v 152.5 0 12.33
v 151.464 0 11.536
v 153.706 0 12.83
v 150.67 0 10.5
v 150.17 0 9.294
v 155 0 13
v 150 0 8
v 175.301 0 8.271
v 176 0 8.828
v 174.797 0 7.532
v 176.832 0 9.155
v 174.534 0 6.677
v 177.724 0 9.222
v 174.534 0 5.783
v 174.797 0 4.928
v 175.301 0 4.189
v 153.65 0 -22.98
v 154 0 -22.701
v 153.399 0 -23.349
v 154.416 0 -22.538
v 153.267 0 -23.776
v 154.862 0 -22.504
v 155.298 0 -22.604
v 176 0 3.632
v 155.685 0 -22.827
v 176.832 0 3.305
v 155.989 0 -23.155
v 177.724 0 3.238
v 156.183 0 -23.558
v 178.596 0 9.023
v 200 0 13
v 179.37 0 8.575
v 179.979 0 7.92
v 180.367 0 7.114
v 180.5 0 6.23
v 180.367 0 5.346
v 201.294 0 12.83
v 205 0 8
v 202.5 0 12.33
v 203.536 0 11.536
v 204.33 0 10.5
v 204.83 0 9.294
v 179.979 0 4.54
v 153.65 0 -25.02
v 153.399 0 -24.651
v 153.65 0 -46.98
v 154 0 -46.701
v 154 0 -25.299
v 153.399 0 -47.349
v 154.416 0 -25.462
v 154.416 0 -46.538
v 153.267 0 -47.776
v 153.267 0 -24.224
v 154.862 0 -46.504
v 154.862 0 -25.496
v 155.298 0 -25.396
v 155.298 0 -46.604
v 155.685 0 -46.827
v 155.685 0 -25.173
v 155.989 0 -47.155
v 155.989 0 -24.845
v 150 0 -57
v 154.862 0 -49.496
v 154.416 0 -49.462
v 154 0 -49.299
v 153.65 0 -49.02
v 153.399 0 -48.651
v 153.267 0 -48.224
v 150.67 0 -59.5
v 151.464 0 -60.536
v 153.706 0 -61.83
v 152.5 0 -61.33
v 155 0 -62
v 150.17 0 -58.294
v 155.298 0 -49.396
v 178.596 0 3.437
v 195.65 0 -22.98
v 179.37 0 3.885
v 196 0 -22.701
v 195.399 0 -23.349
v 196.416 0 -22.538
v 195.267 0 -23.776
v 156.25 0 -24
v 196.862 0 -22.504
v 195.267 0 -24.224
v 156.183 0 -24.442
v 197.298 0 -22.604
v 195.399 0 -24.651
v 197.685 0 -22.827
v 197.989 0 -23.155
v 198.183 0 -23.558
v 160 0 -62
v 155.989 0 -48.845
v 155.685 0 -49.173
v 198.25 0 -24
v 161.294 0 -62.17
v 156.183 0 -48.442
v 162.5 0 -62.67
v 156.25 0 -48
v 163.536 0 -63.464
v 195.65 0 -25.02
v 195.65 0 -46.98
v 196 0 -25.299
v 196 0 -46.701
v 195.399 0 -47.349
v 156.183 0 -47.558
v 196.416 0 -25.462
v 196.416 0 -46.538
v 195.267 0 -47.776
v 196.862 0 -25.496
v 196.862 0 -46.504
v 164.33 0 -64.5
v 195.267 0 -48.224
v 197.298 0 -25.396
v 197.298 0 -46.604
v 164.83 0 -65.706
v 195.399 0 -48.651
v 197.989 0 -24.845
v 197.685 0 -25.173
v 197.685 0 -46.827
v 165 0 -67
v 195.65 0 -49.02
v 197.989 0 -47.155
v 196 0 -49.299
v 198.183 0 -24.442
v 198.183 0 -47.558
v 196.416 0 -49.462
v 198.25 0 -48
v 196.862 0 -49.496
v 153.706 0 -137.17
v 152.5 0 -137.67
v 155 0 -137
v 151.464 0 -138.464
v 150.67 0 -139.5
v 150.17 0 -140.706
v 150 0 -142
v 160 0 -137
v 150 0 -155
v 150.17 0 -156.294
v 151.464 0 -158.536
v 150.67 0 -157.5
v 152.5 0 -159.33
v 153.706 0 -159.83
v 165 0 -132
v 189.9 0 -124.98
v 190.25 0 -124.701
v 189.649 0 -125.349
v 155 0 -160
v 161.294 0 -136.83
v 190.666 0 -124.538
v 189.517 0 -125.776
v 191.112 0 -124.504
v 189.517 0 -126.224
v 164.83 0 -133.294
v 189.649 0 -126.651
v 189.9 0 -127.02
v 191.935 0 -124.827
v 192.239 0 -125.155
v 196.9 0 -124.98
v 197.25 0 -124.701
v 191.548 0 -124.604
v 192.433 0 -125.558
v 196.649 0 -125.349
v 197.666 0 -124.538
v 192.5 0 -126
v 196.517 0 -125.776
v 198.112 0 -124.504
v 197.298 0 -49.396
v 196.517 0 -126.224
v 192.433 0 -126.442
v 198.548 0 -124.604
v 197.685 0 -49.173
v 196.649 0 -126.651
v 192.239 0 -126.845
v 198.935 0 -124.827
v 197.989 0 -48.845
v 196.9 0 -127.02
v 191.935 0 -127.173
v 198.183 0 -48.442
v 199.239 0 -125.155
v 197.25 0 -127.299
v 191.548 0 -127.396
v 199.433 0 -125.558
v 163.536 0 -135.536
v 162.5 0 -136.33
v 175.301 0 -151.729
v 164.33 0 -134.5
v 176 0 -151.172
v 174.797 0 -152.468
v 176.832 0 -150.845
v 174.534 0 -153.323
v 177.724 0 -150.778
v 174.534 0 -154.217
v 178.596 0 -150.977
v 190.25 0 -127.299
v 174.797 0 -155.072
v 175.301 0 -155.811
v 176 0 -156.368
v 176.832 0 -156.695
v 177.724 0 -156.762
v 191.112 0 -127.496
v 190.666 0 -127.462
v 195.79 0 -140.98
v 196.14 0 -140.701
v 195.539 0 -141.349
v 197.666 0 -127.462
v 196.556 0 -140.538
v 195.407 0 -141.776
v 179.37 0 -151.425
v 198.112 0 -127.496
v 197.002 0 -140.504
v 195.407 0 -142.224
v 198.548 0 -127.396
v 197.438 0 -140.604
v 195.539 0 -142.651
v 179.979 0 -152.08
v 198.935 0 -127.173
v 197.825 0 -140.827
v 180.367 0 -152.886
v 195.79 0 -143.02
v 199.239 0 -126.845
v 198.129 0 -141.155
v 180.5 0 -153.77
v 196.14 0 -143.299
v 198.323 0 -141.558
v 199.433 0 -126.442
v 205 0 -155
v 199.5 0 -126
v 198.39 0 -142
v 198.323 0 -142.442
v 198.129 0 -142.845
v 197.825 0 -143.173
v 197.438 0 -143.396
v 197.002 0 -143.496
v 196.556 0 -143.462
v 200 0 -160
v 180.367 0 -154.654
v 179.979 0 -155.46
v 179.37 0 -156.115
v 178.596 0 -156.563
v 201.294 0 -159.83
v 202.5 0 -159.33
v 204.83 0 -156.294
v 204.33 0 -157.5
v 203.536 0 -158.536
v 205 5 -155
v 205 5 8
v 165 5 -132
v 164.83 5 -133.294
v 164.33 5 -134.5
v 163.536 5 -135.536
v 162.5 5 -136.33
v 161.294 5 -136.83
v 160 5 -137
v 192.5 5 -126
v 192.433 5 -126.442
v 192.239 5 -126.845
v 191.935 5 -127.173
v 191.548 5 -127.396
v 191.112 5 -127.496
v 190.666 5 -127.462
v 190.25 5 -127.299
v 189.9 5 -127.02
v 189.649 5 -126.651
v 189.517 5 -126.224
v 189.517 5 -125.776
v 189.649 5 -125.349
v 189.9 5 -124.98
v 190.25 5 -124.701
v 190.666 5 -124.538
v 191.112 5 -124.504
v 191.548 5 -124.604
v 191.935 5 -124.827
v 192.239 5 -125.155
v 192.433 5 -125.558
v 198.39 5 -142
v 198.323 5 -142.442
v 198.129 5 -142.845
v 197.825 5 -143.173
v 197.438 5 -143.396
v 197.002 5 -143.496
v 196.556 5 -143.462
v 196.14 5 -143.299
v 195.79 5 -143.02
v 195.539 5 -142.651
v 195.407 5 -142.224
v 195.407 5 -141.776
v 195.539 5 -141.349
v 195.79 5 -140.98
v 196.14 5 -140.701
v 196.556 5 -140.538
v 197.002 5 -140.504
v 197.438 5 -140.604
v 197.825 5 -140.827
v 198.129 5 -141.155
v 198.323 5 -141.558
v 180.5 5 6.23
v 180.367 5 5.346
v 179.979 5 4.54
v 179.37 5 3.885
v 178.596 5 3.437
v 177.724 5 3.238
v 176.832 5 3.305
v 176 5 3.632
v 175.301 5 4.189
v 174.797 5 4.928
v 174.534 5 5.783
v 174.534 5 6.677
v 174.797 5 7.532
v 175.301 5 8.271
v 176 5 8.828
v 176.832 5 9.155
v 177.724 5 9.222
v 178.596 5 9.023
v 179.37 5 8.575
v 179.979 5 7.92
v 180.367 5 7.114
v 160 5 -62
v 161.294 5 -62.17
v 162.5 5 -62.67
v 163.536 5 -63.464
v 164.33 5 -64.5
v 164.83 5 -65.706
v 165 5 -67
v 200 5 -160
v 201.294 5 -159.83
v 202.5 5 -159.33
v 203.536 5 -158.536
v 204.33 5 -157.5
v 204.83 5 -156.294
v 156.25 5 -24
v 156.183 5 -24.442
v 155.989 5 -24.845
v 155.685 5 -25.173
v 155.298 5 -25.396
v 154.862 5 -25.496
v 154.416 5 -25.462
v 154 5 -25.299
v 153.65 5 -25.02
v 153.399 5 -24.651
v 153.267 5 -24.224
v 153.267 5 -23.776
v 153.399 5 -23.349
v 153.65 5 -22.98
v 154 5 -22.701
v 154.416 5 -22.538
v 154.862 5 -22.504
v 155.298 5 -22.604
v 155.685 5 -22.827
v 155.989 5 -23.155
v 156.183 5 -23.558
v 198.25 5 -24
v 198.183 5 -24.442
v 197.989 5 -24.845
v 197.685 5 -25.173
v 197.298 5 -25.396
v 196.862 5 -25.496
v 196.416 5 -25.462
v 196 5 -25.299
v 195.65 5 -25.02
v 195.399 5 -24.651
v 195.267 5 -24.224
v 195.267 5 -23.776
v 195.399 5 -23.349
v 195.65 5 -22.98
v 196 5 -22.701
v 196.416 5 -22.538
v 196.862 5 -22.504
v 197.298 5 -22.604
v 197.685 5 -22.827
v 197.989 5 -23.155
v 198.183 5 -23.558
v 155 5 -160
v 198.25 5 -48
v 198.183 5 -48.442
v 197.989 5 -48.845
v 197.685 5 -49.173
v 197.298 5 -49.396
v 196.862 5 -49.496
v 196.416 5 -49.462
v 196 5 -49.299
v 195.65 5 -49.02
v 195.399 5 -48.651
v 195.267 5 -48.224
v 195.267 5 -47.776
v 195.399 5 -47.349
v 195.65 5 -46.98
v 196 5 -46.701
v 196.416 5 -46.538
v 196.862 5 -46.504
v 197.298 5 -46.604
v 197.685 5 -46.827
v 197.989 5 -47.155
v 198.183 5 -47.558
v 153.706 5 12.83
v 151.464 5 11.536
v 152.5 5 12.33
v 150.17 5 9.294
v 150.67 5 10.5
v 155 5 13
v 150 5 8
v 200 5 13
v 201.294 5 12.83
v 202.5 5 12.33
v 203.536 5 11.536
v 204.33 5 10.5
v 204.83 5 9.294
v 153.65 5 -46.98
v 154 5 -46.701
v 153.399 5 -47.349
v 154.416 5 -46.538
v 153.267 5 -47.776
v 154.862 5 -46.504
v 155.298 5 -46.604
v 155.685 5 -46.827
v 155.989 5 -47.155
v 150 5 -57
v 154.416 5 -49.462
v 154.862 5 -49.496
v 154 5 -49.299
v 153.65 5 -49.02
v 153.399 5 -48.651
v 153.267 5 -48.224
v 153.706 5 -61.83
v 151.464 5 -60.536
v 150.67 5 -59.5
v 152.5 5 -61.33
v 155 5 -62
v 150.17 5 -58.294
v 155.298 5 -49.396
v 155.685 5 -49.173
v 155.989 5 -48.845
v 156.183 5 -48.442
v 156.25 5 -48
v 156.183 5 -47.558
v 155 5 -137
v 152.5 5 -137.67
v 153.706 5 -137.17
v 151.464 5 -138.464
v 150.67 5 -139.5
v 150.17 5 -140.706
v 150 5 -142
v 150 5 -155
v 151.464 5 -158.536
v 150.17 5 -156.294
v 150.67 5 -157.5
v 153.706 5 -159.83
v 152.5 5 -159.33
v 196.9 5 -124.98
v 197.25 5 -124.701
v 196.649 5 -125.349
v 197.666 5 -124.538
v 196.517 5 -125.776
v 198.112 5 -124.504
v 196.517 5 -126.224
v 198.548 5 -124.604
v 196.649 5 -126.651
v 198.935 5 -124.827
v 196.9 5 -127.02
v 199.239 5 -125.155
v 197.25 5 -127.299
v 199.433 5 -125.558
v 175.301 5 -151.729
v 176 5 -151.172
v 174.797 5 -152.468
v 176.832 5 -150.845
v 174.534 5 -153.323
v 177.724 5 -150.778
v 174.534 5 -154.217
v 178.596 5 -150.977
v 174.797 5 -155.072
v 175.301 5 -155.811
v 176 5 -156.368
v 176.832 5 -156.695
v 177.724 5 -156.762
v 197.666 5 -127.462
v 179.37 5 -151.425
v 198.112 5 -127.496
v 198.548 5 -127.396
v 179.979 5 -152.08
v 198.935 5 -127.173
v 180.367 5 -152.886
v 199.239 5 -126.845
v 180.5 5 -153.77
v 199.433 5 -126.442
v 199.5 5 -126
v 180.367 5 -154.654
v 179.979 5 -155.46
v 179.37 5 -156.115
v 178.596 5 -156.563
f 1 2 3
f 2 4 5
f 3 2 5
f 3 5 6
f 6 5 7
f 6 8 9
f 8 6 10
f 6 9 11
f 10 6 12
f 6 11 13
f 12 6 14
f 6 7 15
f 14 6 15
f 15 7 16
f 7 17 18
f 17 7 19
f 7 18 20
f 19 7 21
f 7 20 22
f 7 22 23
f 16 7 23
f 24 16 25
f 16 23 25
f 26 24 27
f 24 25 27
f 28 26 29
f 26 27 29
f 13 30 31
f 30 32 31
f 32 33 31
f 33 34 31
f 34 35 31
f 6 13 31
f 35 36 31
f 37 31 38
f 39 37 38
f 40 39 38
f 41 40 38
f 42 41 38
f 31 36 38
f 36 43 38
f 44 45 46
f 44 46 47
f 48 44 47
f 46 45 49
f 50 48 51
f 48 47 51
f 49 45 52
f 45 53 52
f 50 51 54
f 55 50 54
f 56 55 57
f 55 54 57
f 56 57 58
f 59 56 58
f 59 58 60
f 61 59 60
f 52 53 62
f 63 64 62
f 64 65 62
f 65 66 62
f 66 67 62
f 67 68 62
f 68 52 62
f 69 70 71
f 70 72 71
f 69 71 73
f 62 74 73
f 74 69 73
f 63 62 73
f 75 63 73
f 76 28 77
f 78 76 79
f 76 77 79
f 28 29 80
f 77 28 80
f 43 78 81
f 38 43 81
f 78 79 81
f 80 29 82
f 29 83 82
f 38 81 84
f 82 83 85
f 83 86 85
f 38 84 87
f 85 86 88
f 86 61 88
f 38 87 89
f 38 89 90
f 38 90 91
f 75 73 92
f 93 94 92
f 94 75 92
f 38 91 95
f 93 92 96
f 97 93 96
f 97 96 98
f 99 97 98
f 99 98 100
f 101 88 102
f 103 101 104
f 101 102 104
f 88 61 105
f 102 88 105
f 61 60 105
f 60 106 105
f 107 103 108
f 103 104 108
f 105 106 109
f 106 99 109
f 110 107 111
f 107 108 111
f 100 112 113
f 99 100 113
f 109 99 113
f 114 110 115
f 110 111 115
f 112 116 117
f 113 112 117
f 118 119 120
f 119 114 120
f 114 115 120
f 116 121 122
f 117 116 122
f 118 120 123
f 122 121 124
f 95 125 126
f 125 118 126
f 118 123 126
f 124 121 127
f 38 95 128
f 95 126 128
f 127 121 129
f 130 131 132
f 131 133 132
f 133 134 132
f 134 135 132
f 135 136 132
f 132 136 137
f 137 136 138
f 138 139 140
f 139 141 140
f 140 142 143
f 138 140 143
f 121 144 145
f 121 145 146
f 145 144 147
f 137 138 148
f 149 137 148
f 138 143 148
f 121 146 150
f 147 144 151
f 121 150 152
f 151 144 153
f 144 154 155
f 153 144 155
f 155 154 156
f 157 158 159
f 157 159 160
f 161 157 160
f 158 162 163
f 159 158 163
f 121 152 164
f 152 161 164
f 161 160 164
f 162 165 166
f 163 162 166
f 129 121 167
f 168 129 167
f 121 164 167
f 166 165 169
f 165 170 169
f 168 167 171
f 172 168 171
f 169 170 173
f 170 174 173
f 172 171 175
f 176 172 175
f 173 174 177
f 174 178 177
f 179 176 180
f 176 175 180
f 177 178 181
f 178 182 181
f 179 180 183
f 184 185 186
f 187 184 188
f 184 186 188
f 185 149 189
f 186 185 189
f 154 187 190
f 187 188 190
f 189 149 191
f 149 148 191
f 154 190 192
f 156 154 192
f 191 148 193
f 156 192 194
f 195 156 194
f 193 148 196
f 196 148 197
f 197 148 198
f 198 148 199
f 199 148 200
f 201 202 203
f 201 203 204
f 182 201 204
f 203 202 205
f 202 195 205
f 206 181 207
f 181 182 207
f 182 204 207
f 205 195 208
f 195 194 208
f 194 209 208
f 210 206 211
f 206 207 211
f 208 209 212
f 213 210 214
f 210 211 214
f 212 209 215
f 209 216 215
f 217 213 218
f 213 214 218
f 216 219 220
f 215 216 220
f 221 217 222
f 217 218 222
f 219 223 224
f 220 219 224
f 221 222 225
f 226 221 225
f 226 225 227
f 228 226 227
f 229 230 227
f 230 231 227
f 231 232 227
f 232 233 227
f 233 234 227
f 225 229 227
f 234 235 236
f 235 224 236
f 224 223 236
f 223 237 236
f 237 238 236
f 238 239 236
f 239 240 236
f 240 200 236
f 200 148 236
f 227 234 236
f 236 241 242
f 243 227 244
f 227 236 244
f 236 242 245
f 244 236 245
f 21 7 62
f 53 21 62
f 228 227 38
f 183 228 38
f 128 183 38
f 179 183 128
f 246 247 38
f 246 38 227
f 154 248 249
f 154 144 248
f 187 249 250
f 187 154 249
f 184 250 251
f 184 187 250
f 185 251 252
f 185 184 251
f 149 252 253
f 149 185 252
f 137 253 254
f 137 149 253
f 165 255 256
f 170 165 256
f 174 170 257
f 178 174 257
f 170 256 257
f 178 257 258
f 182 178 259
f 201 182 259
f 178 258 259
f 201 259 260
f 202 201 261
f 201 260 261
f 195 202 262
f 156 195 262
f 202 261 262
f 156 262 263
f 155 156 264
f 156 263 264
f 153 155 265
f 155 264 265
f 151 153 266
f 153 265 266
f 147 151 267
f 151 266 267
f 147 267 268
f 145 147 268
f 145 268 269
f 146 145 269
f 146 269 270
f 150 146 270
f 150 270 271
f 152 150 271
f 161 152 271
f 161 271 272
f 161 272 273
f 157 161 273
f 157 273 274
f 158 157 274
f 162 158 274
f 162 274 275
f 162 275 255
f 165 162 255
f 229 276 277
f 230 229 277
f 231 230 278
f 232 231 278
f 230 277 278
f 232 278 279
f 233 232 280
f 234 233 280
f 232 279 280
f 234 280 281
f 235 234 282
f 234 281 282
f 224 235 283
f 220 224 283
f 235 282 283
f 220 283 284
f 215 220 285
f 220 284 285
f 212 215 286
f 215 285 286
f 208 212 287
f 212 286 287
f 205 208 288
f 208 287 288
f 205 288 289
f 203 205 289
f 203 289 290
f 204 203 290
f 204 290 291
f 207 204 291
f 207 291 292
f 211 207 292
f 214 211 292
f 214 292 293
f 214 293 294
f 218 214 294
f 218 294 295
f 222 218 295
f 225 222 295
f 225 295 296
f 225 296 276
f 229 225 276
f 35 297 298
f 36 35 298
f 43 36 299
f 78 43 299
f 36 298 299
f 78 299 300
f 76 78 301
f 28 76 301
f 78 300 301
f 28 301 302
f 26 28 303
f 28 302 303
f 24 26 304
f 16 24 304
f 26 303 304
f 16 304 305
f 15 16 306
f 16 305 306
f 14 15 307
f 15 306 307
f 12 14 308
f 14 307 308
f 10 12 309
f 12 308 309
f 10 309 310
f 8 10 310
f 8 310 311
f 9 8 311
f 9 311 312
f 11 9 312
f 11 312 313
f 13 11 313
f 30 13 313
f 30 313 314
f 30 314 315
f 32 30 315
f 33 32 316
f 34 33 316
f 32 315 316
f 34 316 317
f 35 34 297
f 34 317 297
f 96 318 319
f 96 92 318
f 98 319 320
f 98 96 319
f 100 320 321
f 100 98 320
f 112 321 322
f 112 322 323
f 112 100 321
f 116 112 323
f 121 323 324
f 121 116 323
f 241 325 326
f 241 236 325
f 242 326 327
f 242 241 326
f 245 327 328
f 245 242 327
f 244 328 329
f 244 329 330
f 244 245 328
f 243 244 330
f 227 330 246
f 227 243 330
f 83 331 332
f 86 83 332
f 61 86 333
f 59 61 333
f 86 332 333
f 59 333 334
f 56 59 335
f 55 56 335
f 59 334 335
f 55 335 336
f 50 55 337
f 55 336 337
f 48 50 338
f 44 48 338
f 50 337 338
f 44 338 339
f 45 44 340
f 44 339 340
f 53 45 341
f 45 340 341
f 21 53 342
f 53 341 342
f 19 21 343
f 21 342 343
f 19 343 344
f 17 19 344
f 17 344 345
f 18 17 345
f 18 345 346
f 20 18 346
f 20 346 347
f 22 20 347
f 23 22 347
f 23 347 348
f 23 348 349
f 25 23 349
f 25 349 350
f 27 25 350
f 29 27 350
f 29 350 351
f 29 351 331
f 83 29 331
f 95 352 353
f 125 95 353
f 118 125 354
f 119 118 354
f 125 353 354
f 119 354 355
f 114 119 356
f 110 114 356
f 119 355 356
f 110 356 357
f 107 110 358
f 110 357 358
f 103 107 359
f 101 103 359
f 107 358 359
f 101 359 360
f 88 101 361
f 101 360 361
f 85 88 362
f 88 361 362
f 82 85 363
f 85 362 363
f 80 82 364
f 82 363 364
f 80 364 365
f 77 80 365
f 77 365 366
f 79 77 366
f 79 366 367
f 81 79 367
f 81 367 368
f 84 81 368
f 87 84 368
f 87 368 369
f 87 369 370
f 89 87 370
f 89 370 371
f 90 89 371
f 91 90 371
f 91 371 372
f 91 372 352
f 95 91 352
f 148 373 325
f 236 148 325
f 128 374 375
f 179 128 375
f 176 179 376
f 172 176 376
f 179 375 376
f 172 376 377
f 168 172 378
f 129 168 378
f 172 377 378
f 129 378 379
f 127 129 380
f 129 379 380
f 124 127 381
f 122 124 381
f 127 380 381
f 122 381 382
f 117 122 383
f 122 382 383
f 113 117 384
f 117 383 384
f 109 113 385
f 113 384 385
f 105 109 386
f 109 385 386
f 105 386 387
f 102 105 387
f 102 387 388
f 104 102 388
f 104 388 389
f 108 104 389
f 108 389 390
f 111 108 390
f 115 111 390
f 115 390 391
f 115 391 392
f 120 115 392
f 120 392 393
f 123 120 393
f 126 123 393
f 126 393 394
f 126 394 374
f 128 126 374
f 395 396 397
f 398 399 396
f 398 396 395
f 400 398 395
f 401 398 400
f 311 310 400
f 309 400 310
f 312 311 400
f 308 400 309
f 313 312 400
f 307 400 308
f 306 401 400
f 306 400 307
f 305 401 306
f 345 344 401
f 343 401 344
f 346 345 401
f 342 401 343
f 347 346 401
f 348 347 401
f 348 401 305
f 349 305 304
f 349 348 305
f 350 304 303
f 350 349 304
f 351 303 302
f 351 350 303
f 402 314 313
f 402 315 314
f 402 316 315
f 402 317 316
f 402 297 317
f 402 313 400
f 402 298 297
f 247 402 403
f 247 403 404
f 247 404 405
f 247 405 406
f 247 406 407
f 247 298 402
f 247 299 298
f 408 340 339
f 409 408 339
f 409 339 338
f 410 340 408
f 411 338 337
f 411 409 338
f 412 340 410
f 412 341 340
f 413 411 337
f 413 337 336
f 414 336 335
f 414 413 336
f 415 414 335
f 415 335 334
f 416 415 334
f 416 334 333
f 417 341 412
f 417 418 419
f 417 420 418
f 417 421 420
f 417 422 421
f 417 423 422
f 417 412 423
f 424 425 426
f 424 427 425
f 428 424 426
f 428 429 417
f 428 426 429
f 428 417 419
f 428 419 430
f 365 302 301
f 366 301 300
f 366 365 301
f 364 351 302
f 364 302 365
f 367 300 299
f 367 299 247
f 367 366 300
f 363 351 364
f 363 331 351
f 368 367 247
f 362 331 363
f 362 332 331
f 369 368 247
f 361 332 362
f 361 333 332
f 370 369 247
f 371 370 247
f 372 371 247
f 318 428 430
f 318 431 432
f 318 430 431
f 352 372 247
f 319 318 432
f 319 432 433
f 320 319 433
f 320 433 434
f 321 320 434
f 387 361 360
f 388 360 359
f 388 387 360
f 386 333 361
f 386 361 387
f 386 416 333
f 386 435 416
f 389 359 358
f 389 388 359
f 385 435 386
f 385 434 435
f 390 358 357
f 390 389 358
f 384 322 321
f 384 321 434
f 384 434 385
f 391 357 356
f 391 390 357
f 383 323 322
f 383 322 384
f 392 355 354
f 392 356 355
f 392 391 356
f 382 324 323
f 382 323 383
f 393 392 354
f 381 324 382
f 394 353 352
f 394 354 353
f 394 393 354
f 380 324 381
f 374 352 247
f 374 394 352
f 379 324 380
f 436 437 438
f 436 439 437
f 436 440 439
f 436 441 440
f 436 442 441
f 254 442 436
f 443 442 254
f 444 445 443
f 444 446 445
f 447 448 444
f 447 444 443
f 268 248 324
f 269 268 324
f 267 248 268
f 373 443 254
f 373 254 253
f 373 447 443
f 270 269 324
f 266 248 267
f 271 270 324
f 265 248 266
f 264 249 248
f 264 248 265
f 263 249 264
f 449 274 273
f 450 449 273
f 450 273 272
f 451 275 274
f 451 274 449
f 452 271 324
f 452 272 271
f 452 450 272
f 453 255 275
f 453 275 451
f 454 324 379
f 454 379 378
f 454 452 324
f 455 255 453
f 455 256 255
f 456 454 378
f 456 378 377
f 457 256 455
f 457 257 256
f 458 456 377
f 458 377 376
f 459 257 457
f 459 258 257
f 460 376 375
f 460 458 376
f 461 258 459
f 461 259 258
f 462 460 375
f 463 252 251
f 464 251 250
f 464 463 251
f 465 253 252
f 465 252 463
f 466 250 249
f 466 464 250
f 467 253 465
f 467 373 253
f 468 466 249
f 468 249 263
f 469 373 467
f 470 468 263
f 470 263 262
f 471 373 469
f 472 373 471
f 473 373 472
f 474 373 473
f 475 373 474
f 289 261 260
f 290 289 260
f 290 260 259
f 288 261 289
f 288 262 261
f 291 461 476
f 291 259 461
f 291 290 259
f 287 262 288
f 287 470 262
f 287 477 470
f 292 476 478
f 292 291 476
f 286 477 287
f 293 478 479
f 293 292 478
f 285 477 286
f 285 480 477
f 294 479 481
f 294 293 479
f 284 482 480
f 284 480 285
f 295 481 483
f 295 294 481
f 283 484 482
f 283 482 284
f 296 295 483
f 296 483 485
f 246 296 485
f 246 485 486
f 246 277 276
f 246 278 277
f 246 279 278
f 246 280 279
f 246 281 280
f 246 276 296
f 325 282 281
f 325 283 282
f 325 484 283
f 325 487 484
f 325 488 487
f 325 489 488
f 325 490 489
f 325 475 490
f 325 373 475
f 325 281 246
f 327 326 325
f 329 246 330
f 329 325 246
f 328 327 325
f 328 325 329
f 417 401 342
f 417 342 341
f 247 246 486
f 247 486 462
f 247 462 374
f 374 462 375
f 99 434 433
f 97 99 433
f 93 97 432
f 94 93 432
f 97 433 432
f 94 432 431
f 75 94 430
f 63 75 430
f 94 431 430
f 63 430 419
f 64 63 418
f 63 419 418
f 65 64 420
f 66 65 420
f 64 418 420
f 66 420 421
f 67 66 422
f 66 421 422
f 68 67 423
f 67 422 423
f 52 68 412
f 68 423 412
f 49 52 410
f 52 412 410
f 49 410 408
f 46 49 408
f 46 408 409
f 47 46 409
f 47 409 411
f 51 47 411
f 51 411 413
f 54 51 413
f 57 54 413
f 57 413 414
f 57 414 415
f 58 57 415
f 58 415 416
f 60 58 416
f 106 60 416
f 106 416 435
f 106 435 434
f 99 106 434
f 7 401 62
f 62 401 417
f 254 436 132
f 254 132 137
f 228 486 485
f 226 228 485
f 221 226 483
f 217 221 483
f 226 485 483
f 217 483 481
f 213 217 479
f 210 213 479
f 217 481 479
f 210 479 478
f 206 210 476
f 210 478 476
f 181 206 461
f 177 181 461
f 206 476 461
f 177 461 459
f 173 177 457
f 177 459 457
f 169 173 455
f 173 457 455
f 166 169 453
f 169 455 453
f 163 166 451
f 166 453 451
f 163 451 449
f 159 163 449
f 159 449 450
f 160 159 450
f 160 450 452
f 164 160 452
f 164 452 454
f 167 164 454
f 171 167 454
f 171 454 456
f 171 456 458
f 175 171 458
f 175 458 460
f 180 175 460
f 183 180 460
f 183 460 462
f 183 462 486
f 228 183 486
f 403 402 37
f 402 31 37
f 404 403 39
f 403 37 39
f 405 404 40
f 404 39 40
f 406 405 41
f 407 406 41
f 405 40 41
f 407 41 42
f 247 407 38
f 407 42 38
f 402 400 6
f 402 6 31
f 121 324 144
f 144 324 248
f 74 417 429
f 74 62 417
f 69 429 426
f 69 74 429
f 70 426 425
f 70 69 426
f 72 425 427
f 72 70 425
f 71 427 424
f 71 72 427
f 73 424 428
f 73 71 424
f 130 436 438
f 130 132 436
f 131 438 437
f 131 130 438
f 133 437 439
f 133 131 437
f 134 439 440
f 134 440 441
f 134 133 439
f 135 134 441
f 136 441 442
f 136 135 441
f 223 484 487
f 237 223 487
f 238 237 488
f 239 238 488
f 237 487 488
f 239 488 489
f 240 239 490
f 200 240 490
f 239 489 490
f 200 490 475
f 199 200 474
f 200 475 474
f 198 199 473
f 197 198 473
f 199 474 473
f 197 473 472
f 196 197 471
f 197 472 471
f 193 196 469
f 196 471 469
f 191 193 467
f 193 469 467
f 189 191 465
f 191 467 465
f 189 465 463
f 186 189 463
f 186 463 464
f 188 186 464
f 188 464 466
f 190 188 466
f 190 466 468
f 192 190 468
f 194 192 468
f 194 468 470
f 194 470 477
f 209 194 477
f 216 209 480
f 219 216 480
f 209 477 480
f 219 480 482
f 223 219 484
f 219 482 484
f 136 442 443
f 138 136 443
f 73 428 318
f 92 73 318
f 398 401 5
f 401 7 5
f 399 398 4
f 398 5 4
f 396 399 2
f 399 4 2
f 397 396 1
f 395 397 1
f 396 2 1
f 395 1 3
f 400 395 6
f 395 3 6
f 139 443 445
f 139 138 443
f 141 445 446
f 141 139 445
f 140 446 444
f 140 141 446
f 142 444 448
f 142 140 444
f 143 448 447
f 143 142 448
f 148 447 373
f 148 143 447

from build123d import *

# Parameters (mm, degrees)
SKETCH1_W           = 200
SKETCH1_H           = 200
BOSS_EXTRUDE1_DEPTH = 5
SKETCH2_W           = 100
SKETCH2_H           = 100
CUT_EXTRUDE1_DEPTH  = 10
FILLET1_R           = 10
FILLET2_R           = 10
SKETCH3_R           = 3
CUT_EXTRUDE2_DEPTH  = 10
SKETCH4_R           = 1.5
CUT_EXTRUDE3_DEPTH  = 10
SKETCH5_W           = 210
SKETCH5_H           = 210
BOSS_EXTRUDE2_DEPTH = 5
FILLET3_R           = 10
CIRPATTERN1_COUNT   = 4
SKETCH6_OUTSIDE_W   = 271.406
SKETCH6_OUTSIDE_H   = 271.406
SKETCH6_OUTSIDE_W_2 = 55
SKETCH6_OUTSIDE_H_2 = 132
CUT_EXTRUDE4_DEPTH  = 10
SKETCH8_W           = 55
SKETCH8_H           = 30
BOSS_EXTRUDE3_DEPTH = 5
SKETCH9_R           = 3
CUT_EXTRUDE6_DEPTH  = 5
SKETCH11_W          = 55
SKETCH11_H          = 19
CUT_EXTRUDE7_DEPTH  = 39
FILLET6_R           = 5
SKETCH12_W          = 15
SKETCH12_H          = 75
CUT_EXTRUDE8_DEPTH  = 10
FILLET7_R           = 5


with BuildPart() as part:
    # Sketch1 → Boss-Extrude1 (new body)
    with BuildSketch(Plane(origin=(0, 0, 0), x_dir=(1, 0, 0), z_dir=(0, 1, 0))):
        with Locations((100, 100)):
            Rectangle(SKETCH1_W, SKETCH1_H)
    extrude(amount=BOSS_EXTRUDE1_DEPTH)

    # Sketch2 → Cut-Extrude1 (cut)
    with BuildSketch(Plane(origin=(0, 5, 0), x_dir=(1, 0, 0), z_dir=(0, 1, 0))):
        with Locations((100, 100)):
            Rectangle(SKETCH2_W, SKETCH2_H)
    extrude(amount=-CUT_EXTRUDE1_DEPTH, mode=Mode.SUBTRACT)

    # Fillet1
    fillet1_edges = [part.edges().sort_by_distance(p)[0] for p in [
        (50, 2.5, -50),
        (150, 2.5, -50),
        (150, 2.5, -150),
        (50, 2.5, -150),
    ]]
    fillet(fillet1_edges, radius=FILLET1_R)

    # Fillet2
    fillet2_edges = [part.edges().sort_by_distance(p)[0] for p in [
        (200, 2.5, 0),
        (0, 2.5, 0),
        (0, 2.5, -200),
        (200, 2.5, -200),
    ]]
    fillet(fillet2_edges, radius=FILLET2_R)

    # Sketch3 → Cut-Extrude2 (cut)
    with BuildSketch(Plane(origin=(0, 5, 0), x_dir=(1, 0, 0), z_dir=(0, 1, 0))):
        with Locations((10, 190)):
            Circle(SKETCH3_R)
        with Locations((190, 190)):
            Circle(SKETCH3_R)
        with Locations((190, 10)):
            Circle(SKETCH3_R)
        with Locations((10, 10)):
            Circle(SKETCH3_R)
    extrude(amount=-CUT_EXTRUDE2_DEPTH, mode=Mode.SUBTRACT)

    # Sketch4 → Cut-Extrude3 (cut)
    with BuildSketch(Plane(origin=(0, 5, 0), x_dir=(1, 0, 0), z_dir=(0, 1, 0))):
        with Locations((198, 126)):
            Circle(SKETCH4_R)
        with Locations((191, 126)):
            Circle(SKETCH4_R)
        with Locations((196.89, 142)):
            Circle(SKETCH4_R)
        with Locations((154.75, 48)):
            Circle(SKETCH4_R)
        with Locations((196.75, 48)):
            Circle(SKETCH4_R)
        with Locations((196.75, 24)):
            Circle(SKETCH4_R)
        with Locations((154.75, 24)):
            Circle(SKETCH4_R)
        with Locations((242.150033952, -166.330778193)):
            Circle(SKETCH4_R)
        with Locations((285.400033952, -64.330778193)):
            Circle(SKETCH4_R)
        with Locations((242.150033952, -142.330778193)):
            Circle(SKETCH4_R)
        with Locations((284.290033952, -48.330778193)):
            Circle(SKETCH4_R)
        with Locations((284.150033952, -142.330778193)):
            Circle(SKETCH4_R)
        with Locations((284.150033952, -166.330778193)):
            Circle(SKETCH4_R)
        with Locations((278.400033952, -64.330778193)):
            Circle(SKETCH4_R)
    cut_extrude3 = extrude(amount=-CUT_EXTRUDE3_DEPTH, mode=Mode.SUBTRACT)

    # Sketch5 → Boss-Extrude2 (add)
    with BuildSketch(Plane(origin=(0, 5, 0), x_dir=(1, 0, 0), z_dir=(0, 1, 0))):
        with Locations((100, 100)):
            Rectangle(SKETCH5_W, SKETCH5_H)
        with BuildLine():
            Line((0, 190), (0, 10))
            ThreePointArc((0, 10), (2.928932188, 2.928932188), (10, 0))
            Line((10, 0), (190, 0))
            ThreePointArc((190, 0), (197.071067812, 2.928932188), (200, 10))
            Line((200, 10), (200, 190))
            ThreePointArc((200, 190), (197.071067812, 197.071067812), (190, 200))
            Line((190, 200), (10, 200))
            ThreePointArc((10, 200), (2.928932188, 197.071067812), (0, 190))
        make_face(mode=Mode.SUBTRACT)
    extrude(amount=-BOSS_EXTRUDE2_DEPTH)

    # Fillet3
    fillet3_edges = [part.edges().sort_by_distance(p)[0] for p in [
        (205, 2.5, -205),
        (-5, 2.5, -205),
        (-5, 2.5, 5),
        (205, 2.5, 5),
    ]]
    fillet(fillet3_edges, radius=FILLET3_R)

    # CirPattern1: Cut-Extrude3 ×4 about axis
    cirpattern1_axis = Axis((100, 5.25, -100), (0, -1, 0))
    for i in range(1, CIRPATTERN1_COUNT):
        add(cut_extrude3.rotate(cirpattern1_axis, i * 360 / CIRPATTERN1_COUNT), mode=Mode.SUBTRACT)

    # Sketch6 outside → Cut-Extrude4 (cut)
    with BuildSketch(Plane(origin=(0, 5, 0), x_dir=(1, 0, 0), z_dir=(0, 1, 0))):
        with Locations((100, 100)):
            Rectangle(SKETCH6_OUTSIDE_W, SKETCH6_OUTSIDE_H)
        with Locations((177.5, 83)):
            Rectangle(SKETCH6_OUTSIDE_W_2, SKETCH6_OUTSIDE_H_2, mode=Mode.SUBTRACT)
    extrude(amount=-CUT_EXTRUDE4_DEPTH, mode=Mode.SUBTRACT)

    # Sketch8 → Boss-Extrude3 (add)
    with BuildSketch(Plane(origin=(0, 5, 0), x_dir=(1, 0, 0), z_dir=(0, 1, 0))):
        with Locations((177.5, 2)):
            Rectangle(SKETCH8_W, SKETCH8_H)
        with Locations((177.5, 164)):
            Rectangle(SKETCH8_W, SKETCH8_H)
    extrude(amount=-BOSS_EXTRUDE3_DEPTH)

    # Sketch9 → Cut-Extrude6 (cut)
    with BuildSketch(Plane(origin=(0, 5, 0), x_dir=(1, 0, 0), z_dir=(0, 1, 0))):
        with Locations((177.5, 153.77)):
            Circle(SKETCH9_R)
        with Locations((177.5, -6.23)):
            Circle(SKETCH9_R)
    extrude(amount=-CUT_EXTRUDE6_DEPTH, mode=Mode.SUBTRACT)

    # Sketch11 → Cut-Extrude7 (cut)
    with BuildSketch(Plane(origin=(0, 5, 0), x_dir=(1, 0, 0), z_dir=(0, 1, 0))):
        with Locations((177.5, 169.5)):
            Rectangle(SKETCH11_W, SKETCH11_H)
    extrude(amount=-CUT_EXTRUDE7_DEPTH, mode=Mode.SUBTRACT)

    # Fillet6
    fillet6_edges = [part.edges().sort_by_distance(p)[0] for p in [
        (205, 2.5, 13),
        (150, 2.5, 13),
        (150, 2.5, -160),
        (205, 2.5, -160),
    ]]
    fillet(fillet6_edges, radius=FILLET6_R)

    # Sketch12 → Cut-Extrude8 (cut)
    with BuildSketch(Plane(origin=(0, 5, 0), x_dir=(1, 0, 0), z_dir=(0, 1, 0))):
        with Locations((157.5, 99.5)):
            Rectangle(SKETCH12_W, SKETCH12_H)
    extrude(amount=-CUT_EXTRUDE8_DEPTH, mode=Mode.SUBTRACT)

    # Fillet7
    fillet7_edges = [part.edges().sort_by_distance(p)[0] for p in [
        (165, 2.5, -137),
        (165, 2.5, -62),
        (150, 2.5, -62),
        (150, 2.5, -137),
    ]]
    fillet(fillet7_edges, radius=FILLET7_R)


solid = part.part
